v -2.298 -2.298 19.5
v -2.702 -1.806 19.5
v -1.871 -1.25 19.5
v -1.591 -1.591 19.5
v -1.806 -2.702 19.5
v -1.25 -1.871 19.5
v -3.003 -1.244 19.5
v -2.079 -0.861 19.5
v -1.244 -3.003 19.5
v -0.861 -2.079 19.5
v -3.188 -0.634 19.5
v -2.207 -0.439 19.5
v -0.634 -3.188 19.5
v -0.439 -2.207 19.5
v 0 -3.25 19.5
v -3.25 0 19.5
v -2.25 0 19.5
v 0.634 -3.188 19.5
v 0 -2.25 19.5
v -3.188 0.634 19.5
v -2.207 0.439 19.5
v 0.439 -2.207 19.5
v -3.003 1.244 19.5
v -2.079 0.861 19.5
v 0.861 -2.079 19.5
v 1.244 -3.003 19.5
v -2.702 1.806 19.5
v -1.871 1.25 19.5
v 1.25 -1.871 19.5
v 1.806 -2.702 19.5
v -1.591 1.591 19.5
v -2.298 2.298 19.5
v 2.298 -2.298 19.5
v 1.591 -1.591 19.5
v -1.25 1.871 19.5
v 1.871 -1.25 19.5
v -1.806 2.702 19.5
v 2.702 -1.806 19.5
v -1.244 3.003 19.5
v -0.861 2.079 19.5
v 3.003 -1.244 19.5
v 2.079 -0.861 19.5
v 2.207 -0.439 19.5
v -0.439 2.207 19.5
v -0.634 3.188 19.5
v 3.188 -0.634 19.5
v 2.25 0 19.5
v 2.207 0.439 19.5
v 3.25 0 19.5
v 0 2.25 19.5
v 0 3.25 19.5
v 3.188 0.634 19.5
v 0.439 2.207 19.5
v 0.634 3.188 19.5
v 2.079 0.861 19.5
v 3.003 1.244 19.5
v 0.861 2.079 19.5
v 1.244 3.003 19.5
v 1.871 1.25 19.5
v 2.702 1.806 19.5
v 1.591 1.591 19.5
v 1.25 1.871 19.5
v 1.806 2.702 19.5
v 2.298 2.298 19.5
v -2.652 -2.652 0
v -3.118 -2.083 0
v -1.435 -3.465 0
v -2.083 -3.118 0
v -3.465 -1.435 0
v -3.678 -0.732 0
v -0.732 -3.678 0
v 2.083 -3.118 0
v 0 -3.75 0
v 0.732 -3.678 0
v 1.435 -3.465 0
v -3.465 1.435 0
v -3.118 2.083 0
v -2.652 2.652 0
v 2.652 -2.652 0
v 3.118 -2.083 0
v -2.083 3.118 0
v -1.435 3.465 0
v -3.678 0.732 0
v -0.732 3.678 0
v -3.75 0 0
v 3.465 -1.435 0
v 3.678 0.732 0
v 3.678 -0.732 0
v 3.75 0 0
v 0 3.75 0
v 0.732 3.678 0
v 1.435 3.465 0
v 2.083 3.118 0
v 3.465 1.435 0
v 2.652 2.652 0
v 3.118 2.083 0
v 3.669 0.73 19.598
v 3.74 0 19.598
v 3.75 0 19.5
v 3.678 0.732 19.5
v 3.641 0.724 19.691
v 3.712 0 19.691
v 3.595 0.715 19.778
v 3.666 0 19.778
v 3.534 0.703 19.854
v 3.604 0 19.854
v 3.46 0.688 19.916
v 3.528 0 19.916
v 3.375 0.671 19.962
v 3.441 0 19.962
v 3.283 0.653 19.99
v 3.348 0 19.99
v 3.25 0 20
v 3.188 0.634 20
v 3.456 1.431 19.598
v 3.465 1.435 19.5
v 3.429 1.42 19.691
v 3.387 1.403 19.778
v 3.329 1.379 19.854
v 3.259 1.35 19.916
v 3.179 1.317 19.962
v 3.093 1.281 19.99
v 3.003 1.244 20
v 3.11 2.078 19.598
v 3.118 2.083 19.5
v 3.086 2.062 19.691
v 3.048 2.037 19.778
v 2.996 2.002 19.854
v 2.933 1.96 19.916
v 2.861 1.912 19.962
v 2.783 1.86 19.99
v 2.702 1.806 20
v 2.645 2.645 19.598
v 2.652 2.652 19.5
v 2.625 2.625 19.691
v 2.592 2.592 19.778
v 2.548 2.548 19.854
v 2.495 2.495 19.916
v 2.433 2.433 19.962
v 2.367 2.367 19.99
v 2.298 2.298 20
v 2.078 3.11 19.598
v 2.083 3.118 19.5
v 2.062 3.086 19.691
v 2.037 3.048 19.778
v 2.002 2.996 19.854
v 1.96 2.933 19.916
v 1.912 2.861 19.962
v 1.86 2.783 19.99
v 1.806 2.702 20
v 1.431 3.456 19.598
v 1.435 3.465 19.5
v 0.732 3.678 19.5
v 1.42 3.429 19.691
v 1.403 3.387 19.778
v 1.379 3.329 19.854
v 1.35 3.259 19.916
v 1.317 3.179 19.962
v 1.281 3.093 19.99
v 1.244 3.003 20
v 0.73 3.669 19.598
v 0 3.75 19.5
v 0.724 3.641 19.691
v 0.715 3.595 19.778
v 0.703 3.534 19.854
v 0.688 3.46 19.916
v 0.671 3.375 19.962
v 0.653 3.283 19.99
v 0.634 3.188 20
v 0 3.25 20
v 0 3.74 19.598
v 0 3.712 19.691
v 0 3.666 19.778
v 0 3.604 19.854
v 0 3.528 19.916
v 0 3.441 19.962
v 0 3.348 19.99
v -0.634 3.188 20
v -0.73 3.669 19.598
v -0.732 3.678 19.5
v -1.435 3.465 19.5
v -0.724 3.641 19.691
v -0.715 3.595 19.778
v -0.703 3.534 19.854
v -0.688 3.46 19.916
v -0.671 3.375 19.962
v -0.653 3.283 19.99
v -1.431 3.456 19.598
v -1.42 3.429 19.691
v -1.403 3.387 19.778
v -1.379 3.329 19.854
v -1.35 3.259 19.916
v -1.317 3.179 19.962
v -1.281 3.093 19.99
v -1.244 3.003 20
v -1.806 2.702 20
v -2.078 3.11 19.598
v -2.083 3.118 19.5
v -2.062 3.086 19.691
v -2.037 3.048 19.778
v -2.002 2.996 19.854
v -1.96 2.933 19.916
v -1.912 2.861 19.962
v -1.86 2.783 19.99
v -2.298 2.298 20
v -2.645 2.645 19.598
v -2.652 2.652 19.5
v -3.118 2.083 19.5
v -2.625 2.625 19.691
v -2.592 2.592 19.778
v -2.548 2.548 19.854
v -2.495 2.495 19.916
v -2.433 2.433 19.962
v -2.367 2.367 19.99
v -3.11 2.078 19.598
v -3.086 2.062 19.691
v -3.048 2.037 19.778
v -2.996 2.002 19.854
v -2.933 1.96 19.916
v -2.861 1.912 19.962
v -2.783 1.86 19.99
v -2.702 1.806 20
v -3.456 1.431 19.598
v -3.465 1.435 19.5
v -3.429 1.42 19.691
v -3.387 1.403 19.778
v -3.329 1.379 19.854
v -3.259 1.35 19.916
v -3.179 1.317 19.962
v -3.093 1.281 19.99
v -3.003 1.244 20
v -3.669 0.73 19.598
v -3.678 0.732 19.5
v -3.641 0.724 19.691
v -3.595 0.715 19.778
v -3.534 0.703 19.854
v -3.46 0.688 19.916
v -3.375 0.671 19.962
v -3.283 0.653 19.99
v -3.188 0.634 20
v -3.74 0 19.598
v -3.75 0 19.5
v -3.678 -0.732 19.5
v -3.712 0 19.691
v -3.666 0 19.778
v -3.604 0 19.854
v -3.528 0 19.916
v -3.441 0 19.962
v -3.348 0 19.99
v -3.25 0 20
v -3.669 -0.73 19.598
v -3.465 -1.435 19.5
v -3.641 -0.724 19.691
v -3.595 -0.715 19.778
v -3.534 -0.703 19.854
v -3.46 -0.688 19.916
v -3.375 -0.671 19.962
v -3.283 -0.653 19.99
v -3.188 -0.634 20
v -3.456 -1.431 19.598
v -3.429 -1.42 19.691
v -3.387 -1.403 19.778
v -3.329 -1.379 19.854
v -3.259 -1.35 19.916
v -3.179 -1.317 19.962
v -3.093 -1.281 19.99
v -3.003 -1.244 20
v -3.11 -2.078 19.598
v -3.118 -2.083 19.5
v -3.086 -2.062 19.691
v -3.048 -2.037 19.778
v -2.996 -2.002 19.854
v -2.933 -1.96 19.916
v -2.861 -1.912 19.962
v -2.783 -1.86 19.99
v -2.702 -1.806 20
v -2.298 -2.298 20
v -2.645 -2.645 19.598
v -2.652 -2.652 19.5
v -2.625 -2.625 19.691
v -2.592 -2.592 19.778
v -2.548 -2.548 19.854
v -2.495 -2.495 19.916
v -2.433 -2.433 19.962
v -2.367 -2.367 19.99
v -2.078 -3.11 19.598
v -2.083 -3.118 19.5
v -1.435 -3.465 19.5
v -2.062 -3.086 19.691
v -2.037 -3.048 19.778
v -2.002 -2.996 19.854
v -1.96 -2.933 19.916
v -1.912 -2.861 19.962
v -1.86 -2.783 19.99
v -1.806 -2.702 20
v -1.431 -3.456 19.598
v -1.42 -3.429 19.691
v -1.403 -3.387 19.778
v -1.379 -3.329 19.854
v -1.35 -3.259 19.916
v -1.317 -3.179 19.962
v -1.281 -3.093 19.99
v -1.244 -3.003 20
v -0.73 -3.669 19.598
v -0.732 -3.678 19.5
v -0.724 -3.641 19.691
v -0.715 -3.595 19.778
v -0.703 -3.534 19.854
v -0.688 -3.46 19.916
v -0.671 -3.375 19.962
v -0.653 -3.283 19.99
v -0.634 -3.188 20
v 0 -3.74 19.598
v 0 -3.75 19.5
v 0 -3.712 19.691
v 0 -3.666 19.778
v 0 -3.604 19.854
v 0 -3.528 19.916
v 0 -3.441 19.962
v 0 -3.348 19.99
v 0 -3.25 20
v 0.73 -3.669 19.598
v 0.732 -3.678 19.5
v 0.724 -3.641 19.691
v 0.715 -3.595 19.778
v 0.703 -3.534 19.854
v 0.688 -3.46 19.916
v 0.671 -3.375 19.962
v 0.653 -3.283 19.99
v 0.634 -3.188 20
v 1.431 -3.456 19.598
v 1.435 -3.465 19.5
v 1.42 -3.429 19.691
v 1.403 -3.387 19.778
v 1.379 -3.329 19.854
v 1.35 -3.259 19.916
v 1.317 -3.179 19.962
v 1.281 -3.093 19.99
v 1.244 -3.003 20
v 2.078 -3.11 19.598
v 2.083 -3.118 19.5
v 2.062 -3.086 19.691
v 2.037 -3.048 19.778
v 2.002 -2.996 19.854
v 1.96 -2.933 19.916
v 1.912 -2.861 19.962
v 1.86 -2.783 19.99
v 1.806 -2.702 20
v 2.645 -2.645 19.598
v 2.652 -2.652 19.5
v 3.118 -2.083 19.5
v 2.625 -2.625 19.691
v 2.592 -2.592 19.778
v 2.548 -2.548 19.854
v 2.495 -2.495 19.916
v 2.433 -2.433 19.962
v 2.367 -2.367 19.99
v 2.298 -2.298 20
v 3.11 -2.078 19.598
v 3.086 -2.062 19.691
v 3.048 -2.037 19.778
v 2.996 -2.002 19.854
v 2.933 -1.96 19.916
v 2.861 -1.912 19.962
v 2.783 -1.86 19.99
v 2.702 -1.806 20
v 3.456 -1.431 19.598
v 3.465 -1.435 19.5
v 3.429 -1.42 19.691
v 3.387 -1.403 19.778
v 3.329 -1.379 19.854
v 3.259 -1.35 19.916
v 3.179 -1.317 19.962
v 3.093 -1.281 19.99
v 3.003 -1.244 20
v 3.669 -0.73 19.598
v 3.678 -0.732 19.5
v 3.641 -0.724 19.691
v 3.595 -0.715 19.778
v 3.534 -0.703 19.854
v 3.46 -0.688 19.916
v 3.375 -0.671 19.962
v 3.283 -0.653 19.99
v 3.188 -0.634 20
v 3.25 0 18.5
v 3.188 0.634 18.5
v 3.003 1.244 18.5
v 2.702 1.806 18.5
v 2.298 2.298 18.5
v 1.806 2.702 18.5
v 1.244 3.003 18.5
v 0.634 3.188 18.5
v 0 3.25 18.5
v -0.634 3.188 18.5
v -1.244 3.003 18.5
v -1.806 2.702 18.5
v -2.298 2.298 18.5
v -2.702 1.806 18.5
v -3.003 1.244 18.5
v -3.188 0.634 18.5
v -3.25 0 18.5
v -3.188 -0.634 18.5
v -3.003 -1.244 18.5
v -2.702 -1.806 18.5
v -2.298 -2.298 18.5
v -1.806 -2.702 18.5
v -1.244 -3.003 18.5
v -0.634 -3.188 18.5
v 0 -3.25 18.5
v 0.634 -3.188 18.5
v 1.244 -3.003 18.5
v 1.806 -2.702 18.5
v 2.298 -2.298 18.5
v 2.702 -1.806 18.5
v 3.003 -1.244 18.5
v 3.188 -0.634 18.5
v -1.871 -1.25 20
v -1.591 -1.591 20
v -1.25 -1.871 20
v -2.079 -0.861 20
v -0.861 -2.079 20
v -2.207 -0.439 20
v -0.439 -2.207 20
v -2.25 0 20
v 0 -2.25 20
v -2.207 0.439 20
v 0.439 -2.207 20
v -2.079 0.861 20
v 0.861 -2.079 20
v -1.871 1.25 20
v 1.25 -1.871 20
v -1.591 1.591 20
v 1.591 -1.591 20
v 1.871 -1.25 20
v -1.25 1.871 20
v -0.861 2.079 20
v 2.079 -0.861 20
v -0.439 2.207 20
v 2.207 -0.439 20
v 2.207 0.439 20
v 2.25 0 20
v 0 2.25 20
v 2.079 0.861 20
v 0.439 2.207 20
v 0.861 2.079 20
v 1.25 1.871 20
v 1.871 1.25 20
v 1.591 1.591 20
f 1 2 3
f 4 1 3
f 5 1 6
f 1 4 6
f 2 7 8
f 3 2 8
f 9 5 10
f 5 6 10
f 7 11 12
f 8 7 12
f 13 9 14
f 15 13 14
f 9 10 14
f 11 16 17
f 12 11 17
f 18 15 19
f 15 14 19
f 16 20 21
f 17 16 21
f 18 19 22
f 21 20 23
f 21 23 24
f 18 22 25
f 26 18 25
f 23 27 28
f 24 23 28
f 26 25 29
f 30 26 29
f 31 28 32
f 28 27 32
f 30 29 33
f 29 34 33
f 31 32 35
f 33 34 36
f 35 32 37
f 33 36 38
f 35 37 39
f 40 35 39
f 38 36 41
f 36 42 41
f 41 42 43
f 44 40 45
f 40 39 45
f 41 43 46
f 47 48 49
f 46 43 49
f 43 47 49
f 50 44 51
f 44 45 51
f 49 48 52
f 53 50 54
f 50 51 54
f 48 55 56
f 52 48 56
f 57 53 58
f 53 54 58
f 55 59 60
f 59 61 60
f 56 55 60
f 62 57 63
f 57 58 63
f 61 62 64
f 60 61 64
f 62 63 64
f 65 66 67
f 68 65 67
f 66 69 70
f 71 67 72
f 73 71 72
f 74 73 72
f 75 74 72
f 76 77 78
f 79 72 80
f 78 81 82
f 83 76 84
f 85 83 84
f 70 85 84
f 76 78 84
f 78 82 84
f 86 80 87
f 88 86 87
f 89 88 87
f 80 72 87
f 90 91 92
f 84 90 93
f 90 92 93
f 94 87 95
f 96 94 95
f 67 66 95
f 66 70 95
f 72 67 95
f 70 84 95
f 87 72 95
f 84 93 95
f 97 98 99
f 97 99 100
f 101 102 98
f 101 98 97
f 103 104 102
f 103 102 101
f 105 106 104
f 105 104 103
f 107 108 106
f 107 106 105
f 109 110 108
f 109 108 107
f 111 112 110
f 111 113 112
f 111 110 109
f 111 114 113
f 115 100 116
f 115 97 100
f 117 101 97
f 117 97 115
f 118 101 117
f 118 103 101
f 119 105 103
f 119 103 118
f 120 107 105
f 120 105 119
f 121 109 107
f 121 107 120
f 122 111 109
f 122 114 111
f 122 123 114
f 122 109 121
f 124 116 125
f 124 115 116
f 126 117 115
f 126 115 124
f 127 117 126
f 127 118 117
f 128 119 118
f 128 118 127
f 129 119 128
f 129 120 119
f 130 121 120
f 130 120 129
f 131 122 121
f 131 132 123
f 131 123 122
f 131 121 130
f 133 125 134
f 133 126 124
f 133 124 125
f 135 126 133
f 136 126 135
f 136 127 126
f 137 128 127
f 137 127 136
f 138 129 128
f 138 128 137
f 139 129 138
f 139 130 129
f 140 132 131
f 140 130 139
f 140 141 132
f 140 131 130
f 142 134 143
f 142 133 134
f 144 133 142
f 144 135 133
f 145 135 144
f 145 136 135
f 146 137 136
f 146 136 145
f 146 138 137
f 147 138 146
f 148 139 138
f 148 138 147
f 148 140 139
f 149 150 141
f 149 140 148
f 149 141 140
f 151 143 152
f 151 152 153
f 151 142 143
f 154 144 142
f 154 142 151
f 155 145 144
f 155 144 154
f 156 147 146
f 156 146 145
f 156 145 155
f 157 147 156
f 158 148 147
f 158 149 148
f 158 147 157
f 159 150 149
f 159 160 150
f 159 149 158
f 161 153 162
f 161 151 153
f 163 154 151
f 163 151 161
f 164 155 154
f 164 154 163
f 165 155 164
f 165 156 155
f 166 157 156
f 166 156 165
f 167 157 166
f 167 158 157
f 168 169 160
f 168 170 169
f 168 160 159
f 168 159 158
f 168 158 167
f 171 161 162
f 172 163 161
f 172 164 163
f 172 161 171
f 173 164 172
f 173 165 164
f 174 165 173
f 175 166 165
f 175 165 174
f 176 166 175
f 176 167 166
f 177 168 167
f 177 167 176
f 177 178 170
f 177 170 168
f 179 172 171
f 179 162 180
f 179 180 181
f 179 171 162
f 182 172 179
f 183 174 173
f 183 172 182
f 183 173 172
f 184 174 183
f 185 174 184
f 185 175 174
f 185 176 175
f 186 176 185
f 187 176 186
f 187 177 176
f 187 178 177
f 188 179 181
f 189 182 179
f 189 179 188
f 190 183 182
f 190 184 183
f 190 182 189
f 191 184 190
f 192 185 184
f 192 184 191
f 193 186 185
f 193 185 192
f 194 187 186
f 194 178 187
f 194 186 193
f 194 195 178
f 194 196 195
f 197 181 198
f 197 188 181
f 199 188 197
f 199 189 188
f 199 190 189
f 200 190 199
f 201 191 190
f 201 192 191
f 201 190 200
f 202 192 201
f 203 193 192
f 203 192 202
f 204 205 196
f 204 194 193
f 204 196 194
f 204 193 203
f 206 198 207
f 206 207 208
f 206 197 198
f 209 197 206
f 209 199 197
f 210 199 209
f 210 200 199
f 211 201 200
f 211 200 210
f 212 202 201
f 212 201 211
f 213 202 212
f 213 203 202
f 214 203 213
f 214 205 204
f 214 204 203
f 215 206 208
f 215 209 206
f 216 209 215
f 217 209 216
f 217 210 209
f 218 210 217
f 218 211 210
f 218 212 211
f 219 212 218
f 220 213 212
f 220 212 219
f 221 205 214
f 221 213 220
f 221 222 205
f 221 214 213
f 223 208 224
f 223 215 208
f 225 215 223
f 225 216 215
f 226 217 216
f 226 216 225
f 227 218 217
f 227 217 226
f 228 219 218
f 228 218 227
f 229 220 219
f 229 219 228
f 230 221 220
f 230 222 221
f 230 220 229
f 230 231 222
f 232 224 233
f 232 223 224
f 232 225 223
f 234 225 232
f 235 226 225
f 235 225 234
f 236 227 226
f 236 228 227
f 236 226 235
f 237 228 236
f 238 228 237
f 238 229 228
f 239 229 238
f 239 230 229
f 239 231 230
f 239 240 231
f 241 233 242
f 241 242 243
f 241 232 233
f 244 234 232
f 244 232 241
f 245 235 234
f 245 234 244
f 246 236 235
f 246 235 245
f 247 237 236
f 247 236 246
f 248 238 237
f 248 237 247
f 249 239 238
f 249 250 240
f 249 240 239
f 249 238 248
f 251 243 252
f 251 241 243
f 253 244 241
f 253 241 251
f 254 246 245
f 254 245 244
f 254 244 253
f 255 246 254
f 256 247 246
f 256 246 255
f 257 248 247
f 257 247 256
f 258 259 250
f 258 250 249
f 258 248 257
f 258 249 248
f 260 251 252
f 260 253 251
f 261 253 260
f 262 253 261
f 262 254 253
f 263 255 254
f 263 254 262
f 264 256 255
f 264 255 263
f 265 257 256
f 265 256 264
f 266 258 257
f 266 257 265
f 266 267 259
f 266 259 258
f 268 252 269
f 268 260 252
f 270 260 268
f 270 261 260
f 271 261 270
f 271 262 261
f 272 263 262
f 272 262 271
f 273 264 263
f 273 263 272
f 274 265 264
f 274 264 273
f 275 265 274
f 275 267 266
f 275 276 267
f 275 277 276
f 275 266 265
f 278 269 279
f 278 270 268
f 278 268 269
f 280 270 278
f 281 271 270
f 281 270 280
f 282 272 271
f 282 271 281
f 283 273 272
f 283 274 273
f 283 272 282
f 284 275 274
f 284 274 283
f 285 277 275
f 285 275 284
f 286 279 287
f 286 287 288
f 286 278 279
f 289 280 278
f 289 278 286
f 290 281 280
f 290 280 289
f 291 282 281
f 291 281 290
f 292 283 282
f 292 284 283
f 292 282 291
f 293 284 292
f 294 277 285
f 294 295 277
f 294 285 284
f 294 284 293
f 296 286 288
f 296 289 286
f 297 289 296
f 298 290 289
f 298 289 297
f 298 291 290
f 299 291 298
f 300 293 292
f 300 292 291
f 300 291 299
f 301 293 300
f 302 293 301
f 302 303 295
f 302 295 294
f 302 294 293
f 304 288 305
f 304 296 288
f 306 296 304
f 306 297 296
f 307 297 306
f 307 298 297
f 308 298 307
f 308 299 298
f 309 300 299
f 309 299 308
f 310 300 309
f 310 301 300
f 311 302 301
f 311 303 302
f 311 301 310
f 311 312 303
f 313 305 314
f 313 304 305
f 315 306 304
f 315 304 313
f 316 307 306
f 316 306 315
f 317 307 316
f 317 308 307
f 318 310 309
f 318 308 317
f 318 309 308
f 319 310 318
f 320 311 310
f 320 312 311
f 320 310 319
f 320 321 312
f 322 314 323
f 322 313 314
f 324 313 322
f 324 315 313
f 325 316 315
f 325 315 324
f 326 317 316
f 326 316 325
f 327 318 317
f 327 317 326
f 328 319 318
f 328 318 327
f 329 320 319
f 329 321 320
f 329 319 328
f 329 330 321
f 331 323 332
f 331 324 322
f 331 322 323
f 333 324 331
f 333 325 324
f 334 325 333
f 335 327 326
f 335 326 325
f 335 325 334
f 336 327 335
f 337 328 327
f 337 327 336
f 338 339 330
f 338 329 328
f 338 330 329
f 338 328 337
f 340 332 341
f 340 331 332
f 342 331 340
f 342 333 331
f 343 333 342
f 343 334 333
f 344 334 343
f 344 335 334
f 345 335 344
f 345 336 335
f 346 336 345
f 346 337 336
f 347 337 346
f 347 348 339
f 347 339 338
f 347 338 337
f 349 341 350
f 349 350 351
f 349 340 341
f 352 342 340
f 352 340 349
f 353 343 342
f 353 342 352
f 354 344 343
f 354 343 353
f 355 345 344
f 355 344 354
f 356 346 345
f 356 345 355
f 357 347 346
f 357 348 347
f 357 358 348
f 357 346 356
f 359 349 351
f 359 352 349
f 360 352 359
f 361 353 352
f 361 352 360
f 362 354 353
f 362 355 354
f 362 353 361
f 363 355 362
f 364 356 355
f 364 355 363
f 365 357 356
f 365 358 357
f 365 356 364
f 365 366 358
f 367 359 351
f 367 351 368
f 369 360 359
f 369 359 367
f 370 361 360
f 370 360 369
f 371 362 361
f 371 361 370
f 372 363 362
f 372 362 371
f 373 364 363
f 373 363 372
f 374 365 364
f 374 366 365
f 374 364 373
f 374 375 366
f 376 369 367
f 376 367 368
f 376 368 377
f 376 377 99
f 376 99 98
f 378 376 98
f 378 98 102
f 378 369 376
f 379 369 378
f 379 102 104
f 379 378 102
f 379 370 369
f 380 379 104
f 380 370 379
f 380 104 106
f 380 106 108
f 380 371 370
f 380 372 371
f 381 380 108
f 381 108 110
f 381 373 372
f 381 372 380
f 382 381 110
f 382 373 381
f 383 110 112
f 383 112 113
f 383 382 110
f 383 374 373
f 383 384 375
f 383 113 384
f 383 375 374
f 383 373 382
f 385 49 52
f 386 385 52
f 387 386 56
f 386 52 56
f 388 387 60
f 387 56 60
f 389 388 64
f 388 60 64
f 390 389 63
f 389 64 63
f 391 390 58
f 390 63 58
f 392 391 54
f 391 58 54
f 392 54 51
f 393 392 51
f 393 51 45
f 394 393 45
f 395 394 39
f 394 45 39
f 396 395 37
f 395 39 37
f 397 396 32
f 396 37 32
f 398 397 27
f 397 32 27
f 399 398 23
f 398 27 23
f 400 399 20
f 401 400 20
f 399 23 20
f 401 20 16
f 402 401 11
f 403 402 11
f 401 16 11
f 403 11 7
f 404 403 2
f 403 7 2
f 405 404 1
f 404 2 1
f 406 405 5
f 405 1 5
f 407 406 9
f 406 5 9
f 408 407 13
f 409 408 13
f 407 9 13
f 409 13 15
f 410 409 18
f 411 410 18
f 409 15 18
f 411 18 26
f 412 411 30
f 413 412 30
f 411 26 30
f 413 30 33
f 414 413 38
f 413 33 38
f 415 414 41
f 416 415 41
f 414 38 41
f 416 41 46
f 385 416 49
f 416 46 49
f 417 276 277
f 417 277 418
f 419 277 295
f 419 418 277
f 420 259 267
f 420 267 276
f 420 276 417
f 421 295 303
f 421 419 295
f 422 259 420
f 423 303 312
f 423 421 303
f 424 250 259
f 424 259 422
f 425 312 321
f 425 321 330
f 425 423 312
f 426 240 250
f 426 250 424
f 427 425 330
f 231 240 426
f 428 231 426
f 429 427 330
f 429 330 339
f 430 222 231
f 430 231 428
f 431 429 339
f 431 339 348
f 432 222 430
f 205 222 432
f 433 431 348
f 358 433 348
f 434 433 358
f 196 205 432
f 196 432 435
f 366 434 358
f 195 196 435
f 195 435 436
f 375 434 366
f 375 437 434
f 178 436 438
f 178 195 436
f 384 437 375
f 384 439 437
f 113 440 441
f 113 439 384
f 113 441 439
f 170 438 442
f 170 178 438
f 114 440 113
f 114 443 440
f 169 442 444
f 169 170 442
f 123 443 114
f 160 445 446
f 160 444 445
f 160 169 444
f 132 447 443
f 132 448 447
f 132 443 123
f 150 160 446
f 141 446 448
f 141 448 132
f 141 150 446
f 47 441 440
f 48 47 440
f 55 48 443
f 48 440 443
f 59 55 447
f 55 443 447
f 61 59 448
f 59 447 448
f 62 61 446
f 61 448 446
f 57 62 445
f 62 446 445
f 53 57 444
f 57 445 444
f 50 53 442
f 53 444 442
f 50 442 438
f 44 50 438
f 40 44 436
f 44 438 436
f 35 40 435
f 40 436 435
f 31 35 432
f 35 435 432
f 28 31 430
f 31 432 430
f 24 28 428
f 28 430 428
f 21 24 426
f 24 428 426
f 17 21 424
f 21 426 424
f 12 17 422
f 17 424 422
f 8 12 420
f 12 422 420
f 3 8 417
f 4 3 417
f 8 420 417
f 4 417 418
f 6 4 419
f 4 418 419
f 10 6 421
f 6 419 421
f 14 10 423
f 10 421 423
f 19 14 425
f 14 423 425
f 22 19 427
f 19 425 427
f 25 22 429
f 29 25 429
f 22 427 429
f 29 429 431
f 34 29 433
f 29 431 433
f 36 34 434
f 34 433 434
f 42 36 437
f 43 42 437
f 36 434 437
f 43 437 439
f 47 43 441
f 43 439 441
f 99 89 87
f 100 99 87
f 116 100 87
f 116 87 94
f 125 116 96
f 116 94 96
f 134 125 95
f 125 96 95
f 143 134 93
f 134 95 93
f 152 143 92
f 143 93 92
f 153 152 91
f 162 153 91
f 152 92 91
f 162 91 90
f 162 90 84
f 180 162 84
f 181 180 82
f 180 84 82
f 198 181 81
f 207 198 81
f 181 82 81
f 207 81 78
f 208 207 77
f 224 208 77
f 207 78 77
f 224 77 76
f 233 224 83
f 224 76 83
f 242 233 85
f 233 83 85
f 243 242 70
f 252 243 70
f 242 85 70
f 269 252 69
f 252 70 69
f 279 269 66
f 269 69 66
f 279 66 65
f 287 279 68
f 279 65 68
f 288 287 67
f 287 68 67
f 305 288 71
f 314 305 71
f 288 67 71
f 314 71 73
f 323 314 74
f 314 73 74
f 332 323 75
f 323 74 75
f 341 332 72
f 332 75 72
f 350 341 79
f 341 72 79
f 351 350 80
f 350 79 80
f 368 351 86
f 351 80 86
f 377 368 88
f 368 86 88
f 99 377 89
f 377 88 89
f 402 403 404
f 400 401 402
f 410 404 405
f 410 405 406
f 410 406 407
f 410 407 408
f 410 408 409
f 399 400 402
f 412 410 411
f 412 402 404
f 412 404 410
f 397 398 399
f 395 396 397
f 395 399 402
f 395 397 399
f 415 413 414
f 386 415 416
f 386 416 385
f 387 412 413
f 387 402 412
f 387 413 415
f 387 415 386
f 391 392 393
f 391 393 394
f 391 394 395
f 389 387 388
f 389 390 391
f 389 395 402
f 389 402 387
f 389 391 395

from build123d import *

# Parameters (mm, degrees)
SKETCH053_R     = 3.75
PAD026_DEPTH    = 20
SKETCH054_R     = 2.25
POCKET018_DEPTH = 0.5
SKETCH050_R     = 3.25
POCKET016_DEPTH = 1
FILLET007_R     = 0.5


with BuildPart() as part:
    # Sketch053 → Pad026 (new body)
    with BuildSketch(Plane.XY):
        Circle(SKETCH053_R)
    extrude(amount=PAD026_DEPTH)

    # Sketch054 (on Face3 of Pad026) → Pocket018 (cut)
    with BuildSketch(Plane.XY.offset(20)):
        Circle(SKETCH054_R)
    extrude(amount=-POCKET018_DEPTH, mode=Mode.SUBTRACT)

    # Sketch050 (on Face5 of Pocket018) → Pocket016 (cut)
    with BuildSketch(Plane.XY.offset(19.5)):
        Circle(SKETCH050_R)
    extrude(amount=-POCKET016_DEPTH, mode=Mode.SUBTRACT)

    # Fillet007
    fillet007_edges = [part.edges().sort_by_distance(p)[0] for p in [
        (-3.75, 0, 20),
    ]]
    fillet(fillet007_edges, radius=FILLET007_R)


solid = part.part
